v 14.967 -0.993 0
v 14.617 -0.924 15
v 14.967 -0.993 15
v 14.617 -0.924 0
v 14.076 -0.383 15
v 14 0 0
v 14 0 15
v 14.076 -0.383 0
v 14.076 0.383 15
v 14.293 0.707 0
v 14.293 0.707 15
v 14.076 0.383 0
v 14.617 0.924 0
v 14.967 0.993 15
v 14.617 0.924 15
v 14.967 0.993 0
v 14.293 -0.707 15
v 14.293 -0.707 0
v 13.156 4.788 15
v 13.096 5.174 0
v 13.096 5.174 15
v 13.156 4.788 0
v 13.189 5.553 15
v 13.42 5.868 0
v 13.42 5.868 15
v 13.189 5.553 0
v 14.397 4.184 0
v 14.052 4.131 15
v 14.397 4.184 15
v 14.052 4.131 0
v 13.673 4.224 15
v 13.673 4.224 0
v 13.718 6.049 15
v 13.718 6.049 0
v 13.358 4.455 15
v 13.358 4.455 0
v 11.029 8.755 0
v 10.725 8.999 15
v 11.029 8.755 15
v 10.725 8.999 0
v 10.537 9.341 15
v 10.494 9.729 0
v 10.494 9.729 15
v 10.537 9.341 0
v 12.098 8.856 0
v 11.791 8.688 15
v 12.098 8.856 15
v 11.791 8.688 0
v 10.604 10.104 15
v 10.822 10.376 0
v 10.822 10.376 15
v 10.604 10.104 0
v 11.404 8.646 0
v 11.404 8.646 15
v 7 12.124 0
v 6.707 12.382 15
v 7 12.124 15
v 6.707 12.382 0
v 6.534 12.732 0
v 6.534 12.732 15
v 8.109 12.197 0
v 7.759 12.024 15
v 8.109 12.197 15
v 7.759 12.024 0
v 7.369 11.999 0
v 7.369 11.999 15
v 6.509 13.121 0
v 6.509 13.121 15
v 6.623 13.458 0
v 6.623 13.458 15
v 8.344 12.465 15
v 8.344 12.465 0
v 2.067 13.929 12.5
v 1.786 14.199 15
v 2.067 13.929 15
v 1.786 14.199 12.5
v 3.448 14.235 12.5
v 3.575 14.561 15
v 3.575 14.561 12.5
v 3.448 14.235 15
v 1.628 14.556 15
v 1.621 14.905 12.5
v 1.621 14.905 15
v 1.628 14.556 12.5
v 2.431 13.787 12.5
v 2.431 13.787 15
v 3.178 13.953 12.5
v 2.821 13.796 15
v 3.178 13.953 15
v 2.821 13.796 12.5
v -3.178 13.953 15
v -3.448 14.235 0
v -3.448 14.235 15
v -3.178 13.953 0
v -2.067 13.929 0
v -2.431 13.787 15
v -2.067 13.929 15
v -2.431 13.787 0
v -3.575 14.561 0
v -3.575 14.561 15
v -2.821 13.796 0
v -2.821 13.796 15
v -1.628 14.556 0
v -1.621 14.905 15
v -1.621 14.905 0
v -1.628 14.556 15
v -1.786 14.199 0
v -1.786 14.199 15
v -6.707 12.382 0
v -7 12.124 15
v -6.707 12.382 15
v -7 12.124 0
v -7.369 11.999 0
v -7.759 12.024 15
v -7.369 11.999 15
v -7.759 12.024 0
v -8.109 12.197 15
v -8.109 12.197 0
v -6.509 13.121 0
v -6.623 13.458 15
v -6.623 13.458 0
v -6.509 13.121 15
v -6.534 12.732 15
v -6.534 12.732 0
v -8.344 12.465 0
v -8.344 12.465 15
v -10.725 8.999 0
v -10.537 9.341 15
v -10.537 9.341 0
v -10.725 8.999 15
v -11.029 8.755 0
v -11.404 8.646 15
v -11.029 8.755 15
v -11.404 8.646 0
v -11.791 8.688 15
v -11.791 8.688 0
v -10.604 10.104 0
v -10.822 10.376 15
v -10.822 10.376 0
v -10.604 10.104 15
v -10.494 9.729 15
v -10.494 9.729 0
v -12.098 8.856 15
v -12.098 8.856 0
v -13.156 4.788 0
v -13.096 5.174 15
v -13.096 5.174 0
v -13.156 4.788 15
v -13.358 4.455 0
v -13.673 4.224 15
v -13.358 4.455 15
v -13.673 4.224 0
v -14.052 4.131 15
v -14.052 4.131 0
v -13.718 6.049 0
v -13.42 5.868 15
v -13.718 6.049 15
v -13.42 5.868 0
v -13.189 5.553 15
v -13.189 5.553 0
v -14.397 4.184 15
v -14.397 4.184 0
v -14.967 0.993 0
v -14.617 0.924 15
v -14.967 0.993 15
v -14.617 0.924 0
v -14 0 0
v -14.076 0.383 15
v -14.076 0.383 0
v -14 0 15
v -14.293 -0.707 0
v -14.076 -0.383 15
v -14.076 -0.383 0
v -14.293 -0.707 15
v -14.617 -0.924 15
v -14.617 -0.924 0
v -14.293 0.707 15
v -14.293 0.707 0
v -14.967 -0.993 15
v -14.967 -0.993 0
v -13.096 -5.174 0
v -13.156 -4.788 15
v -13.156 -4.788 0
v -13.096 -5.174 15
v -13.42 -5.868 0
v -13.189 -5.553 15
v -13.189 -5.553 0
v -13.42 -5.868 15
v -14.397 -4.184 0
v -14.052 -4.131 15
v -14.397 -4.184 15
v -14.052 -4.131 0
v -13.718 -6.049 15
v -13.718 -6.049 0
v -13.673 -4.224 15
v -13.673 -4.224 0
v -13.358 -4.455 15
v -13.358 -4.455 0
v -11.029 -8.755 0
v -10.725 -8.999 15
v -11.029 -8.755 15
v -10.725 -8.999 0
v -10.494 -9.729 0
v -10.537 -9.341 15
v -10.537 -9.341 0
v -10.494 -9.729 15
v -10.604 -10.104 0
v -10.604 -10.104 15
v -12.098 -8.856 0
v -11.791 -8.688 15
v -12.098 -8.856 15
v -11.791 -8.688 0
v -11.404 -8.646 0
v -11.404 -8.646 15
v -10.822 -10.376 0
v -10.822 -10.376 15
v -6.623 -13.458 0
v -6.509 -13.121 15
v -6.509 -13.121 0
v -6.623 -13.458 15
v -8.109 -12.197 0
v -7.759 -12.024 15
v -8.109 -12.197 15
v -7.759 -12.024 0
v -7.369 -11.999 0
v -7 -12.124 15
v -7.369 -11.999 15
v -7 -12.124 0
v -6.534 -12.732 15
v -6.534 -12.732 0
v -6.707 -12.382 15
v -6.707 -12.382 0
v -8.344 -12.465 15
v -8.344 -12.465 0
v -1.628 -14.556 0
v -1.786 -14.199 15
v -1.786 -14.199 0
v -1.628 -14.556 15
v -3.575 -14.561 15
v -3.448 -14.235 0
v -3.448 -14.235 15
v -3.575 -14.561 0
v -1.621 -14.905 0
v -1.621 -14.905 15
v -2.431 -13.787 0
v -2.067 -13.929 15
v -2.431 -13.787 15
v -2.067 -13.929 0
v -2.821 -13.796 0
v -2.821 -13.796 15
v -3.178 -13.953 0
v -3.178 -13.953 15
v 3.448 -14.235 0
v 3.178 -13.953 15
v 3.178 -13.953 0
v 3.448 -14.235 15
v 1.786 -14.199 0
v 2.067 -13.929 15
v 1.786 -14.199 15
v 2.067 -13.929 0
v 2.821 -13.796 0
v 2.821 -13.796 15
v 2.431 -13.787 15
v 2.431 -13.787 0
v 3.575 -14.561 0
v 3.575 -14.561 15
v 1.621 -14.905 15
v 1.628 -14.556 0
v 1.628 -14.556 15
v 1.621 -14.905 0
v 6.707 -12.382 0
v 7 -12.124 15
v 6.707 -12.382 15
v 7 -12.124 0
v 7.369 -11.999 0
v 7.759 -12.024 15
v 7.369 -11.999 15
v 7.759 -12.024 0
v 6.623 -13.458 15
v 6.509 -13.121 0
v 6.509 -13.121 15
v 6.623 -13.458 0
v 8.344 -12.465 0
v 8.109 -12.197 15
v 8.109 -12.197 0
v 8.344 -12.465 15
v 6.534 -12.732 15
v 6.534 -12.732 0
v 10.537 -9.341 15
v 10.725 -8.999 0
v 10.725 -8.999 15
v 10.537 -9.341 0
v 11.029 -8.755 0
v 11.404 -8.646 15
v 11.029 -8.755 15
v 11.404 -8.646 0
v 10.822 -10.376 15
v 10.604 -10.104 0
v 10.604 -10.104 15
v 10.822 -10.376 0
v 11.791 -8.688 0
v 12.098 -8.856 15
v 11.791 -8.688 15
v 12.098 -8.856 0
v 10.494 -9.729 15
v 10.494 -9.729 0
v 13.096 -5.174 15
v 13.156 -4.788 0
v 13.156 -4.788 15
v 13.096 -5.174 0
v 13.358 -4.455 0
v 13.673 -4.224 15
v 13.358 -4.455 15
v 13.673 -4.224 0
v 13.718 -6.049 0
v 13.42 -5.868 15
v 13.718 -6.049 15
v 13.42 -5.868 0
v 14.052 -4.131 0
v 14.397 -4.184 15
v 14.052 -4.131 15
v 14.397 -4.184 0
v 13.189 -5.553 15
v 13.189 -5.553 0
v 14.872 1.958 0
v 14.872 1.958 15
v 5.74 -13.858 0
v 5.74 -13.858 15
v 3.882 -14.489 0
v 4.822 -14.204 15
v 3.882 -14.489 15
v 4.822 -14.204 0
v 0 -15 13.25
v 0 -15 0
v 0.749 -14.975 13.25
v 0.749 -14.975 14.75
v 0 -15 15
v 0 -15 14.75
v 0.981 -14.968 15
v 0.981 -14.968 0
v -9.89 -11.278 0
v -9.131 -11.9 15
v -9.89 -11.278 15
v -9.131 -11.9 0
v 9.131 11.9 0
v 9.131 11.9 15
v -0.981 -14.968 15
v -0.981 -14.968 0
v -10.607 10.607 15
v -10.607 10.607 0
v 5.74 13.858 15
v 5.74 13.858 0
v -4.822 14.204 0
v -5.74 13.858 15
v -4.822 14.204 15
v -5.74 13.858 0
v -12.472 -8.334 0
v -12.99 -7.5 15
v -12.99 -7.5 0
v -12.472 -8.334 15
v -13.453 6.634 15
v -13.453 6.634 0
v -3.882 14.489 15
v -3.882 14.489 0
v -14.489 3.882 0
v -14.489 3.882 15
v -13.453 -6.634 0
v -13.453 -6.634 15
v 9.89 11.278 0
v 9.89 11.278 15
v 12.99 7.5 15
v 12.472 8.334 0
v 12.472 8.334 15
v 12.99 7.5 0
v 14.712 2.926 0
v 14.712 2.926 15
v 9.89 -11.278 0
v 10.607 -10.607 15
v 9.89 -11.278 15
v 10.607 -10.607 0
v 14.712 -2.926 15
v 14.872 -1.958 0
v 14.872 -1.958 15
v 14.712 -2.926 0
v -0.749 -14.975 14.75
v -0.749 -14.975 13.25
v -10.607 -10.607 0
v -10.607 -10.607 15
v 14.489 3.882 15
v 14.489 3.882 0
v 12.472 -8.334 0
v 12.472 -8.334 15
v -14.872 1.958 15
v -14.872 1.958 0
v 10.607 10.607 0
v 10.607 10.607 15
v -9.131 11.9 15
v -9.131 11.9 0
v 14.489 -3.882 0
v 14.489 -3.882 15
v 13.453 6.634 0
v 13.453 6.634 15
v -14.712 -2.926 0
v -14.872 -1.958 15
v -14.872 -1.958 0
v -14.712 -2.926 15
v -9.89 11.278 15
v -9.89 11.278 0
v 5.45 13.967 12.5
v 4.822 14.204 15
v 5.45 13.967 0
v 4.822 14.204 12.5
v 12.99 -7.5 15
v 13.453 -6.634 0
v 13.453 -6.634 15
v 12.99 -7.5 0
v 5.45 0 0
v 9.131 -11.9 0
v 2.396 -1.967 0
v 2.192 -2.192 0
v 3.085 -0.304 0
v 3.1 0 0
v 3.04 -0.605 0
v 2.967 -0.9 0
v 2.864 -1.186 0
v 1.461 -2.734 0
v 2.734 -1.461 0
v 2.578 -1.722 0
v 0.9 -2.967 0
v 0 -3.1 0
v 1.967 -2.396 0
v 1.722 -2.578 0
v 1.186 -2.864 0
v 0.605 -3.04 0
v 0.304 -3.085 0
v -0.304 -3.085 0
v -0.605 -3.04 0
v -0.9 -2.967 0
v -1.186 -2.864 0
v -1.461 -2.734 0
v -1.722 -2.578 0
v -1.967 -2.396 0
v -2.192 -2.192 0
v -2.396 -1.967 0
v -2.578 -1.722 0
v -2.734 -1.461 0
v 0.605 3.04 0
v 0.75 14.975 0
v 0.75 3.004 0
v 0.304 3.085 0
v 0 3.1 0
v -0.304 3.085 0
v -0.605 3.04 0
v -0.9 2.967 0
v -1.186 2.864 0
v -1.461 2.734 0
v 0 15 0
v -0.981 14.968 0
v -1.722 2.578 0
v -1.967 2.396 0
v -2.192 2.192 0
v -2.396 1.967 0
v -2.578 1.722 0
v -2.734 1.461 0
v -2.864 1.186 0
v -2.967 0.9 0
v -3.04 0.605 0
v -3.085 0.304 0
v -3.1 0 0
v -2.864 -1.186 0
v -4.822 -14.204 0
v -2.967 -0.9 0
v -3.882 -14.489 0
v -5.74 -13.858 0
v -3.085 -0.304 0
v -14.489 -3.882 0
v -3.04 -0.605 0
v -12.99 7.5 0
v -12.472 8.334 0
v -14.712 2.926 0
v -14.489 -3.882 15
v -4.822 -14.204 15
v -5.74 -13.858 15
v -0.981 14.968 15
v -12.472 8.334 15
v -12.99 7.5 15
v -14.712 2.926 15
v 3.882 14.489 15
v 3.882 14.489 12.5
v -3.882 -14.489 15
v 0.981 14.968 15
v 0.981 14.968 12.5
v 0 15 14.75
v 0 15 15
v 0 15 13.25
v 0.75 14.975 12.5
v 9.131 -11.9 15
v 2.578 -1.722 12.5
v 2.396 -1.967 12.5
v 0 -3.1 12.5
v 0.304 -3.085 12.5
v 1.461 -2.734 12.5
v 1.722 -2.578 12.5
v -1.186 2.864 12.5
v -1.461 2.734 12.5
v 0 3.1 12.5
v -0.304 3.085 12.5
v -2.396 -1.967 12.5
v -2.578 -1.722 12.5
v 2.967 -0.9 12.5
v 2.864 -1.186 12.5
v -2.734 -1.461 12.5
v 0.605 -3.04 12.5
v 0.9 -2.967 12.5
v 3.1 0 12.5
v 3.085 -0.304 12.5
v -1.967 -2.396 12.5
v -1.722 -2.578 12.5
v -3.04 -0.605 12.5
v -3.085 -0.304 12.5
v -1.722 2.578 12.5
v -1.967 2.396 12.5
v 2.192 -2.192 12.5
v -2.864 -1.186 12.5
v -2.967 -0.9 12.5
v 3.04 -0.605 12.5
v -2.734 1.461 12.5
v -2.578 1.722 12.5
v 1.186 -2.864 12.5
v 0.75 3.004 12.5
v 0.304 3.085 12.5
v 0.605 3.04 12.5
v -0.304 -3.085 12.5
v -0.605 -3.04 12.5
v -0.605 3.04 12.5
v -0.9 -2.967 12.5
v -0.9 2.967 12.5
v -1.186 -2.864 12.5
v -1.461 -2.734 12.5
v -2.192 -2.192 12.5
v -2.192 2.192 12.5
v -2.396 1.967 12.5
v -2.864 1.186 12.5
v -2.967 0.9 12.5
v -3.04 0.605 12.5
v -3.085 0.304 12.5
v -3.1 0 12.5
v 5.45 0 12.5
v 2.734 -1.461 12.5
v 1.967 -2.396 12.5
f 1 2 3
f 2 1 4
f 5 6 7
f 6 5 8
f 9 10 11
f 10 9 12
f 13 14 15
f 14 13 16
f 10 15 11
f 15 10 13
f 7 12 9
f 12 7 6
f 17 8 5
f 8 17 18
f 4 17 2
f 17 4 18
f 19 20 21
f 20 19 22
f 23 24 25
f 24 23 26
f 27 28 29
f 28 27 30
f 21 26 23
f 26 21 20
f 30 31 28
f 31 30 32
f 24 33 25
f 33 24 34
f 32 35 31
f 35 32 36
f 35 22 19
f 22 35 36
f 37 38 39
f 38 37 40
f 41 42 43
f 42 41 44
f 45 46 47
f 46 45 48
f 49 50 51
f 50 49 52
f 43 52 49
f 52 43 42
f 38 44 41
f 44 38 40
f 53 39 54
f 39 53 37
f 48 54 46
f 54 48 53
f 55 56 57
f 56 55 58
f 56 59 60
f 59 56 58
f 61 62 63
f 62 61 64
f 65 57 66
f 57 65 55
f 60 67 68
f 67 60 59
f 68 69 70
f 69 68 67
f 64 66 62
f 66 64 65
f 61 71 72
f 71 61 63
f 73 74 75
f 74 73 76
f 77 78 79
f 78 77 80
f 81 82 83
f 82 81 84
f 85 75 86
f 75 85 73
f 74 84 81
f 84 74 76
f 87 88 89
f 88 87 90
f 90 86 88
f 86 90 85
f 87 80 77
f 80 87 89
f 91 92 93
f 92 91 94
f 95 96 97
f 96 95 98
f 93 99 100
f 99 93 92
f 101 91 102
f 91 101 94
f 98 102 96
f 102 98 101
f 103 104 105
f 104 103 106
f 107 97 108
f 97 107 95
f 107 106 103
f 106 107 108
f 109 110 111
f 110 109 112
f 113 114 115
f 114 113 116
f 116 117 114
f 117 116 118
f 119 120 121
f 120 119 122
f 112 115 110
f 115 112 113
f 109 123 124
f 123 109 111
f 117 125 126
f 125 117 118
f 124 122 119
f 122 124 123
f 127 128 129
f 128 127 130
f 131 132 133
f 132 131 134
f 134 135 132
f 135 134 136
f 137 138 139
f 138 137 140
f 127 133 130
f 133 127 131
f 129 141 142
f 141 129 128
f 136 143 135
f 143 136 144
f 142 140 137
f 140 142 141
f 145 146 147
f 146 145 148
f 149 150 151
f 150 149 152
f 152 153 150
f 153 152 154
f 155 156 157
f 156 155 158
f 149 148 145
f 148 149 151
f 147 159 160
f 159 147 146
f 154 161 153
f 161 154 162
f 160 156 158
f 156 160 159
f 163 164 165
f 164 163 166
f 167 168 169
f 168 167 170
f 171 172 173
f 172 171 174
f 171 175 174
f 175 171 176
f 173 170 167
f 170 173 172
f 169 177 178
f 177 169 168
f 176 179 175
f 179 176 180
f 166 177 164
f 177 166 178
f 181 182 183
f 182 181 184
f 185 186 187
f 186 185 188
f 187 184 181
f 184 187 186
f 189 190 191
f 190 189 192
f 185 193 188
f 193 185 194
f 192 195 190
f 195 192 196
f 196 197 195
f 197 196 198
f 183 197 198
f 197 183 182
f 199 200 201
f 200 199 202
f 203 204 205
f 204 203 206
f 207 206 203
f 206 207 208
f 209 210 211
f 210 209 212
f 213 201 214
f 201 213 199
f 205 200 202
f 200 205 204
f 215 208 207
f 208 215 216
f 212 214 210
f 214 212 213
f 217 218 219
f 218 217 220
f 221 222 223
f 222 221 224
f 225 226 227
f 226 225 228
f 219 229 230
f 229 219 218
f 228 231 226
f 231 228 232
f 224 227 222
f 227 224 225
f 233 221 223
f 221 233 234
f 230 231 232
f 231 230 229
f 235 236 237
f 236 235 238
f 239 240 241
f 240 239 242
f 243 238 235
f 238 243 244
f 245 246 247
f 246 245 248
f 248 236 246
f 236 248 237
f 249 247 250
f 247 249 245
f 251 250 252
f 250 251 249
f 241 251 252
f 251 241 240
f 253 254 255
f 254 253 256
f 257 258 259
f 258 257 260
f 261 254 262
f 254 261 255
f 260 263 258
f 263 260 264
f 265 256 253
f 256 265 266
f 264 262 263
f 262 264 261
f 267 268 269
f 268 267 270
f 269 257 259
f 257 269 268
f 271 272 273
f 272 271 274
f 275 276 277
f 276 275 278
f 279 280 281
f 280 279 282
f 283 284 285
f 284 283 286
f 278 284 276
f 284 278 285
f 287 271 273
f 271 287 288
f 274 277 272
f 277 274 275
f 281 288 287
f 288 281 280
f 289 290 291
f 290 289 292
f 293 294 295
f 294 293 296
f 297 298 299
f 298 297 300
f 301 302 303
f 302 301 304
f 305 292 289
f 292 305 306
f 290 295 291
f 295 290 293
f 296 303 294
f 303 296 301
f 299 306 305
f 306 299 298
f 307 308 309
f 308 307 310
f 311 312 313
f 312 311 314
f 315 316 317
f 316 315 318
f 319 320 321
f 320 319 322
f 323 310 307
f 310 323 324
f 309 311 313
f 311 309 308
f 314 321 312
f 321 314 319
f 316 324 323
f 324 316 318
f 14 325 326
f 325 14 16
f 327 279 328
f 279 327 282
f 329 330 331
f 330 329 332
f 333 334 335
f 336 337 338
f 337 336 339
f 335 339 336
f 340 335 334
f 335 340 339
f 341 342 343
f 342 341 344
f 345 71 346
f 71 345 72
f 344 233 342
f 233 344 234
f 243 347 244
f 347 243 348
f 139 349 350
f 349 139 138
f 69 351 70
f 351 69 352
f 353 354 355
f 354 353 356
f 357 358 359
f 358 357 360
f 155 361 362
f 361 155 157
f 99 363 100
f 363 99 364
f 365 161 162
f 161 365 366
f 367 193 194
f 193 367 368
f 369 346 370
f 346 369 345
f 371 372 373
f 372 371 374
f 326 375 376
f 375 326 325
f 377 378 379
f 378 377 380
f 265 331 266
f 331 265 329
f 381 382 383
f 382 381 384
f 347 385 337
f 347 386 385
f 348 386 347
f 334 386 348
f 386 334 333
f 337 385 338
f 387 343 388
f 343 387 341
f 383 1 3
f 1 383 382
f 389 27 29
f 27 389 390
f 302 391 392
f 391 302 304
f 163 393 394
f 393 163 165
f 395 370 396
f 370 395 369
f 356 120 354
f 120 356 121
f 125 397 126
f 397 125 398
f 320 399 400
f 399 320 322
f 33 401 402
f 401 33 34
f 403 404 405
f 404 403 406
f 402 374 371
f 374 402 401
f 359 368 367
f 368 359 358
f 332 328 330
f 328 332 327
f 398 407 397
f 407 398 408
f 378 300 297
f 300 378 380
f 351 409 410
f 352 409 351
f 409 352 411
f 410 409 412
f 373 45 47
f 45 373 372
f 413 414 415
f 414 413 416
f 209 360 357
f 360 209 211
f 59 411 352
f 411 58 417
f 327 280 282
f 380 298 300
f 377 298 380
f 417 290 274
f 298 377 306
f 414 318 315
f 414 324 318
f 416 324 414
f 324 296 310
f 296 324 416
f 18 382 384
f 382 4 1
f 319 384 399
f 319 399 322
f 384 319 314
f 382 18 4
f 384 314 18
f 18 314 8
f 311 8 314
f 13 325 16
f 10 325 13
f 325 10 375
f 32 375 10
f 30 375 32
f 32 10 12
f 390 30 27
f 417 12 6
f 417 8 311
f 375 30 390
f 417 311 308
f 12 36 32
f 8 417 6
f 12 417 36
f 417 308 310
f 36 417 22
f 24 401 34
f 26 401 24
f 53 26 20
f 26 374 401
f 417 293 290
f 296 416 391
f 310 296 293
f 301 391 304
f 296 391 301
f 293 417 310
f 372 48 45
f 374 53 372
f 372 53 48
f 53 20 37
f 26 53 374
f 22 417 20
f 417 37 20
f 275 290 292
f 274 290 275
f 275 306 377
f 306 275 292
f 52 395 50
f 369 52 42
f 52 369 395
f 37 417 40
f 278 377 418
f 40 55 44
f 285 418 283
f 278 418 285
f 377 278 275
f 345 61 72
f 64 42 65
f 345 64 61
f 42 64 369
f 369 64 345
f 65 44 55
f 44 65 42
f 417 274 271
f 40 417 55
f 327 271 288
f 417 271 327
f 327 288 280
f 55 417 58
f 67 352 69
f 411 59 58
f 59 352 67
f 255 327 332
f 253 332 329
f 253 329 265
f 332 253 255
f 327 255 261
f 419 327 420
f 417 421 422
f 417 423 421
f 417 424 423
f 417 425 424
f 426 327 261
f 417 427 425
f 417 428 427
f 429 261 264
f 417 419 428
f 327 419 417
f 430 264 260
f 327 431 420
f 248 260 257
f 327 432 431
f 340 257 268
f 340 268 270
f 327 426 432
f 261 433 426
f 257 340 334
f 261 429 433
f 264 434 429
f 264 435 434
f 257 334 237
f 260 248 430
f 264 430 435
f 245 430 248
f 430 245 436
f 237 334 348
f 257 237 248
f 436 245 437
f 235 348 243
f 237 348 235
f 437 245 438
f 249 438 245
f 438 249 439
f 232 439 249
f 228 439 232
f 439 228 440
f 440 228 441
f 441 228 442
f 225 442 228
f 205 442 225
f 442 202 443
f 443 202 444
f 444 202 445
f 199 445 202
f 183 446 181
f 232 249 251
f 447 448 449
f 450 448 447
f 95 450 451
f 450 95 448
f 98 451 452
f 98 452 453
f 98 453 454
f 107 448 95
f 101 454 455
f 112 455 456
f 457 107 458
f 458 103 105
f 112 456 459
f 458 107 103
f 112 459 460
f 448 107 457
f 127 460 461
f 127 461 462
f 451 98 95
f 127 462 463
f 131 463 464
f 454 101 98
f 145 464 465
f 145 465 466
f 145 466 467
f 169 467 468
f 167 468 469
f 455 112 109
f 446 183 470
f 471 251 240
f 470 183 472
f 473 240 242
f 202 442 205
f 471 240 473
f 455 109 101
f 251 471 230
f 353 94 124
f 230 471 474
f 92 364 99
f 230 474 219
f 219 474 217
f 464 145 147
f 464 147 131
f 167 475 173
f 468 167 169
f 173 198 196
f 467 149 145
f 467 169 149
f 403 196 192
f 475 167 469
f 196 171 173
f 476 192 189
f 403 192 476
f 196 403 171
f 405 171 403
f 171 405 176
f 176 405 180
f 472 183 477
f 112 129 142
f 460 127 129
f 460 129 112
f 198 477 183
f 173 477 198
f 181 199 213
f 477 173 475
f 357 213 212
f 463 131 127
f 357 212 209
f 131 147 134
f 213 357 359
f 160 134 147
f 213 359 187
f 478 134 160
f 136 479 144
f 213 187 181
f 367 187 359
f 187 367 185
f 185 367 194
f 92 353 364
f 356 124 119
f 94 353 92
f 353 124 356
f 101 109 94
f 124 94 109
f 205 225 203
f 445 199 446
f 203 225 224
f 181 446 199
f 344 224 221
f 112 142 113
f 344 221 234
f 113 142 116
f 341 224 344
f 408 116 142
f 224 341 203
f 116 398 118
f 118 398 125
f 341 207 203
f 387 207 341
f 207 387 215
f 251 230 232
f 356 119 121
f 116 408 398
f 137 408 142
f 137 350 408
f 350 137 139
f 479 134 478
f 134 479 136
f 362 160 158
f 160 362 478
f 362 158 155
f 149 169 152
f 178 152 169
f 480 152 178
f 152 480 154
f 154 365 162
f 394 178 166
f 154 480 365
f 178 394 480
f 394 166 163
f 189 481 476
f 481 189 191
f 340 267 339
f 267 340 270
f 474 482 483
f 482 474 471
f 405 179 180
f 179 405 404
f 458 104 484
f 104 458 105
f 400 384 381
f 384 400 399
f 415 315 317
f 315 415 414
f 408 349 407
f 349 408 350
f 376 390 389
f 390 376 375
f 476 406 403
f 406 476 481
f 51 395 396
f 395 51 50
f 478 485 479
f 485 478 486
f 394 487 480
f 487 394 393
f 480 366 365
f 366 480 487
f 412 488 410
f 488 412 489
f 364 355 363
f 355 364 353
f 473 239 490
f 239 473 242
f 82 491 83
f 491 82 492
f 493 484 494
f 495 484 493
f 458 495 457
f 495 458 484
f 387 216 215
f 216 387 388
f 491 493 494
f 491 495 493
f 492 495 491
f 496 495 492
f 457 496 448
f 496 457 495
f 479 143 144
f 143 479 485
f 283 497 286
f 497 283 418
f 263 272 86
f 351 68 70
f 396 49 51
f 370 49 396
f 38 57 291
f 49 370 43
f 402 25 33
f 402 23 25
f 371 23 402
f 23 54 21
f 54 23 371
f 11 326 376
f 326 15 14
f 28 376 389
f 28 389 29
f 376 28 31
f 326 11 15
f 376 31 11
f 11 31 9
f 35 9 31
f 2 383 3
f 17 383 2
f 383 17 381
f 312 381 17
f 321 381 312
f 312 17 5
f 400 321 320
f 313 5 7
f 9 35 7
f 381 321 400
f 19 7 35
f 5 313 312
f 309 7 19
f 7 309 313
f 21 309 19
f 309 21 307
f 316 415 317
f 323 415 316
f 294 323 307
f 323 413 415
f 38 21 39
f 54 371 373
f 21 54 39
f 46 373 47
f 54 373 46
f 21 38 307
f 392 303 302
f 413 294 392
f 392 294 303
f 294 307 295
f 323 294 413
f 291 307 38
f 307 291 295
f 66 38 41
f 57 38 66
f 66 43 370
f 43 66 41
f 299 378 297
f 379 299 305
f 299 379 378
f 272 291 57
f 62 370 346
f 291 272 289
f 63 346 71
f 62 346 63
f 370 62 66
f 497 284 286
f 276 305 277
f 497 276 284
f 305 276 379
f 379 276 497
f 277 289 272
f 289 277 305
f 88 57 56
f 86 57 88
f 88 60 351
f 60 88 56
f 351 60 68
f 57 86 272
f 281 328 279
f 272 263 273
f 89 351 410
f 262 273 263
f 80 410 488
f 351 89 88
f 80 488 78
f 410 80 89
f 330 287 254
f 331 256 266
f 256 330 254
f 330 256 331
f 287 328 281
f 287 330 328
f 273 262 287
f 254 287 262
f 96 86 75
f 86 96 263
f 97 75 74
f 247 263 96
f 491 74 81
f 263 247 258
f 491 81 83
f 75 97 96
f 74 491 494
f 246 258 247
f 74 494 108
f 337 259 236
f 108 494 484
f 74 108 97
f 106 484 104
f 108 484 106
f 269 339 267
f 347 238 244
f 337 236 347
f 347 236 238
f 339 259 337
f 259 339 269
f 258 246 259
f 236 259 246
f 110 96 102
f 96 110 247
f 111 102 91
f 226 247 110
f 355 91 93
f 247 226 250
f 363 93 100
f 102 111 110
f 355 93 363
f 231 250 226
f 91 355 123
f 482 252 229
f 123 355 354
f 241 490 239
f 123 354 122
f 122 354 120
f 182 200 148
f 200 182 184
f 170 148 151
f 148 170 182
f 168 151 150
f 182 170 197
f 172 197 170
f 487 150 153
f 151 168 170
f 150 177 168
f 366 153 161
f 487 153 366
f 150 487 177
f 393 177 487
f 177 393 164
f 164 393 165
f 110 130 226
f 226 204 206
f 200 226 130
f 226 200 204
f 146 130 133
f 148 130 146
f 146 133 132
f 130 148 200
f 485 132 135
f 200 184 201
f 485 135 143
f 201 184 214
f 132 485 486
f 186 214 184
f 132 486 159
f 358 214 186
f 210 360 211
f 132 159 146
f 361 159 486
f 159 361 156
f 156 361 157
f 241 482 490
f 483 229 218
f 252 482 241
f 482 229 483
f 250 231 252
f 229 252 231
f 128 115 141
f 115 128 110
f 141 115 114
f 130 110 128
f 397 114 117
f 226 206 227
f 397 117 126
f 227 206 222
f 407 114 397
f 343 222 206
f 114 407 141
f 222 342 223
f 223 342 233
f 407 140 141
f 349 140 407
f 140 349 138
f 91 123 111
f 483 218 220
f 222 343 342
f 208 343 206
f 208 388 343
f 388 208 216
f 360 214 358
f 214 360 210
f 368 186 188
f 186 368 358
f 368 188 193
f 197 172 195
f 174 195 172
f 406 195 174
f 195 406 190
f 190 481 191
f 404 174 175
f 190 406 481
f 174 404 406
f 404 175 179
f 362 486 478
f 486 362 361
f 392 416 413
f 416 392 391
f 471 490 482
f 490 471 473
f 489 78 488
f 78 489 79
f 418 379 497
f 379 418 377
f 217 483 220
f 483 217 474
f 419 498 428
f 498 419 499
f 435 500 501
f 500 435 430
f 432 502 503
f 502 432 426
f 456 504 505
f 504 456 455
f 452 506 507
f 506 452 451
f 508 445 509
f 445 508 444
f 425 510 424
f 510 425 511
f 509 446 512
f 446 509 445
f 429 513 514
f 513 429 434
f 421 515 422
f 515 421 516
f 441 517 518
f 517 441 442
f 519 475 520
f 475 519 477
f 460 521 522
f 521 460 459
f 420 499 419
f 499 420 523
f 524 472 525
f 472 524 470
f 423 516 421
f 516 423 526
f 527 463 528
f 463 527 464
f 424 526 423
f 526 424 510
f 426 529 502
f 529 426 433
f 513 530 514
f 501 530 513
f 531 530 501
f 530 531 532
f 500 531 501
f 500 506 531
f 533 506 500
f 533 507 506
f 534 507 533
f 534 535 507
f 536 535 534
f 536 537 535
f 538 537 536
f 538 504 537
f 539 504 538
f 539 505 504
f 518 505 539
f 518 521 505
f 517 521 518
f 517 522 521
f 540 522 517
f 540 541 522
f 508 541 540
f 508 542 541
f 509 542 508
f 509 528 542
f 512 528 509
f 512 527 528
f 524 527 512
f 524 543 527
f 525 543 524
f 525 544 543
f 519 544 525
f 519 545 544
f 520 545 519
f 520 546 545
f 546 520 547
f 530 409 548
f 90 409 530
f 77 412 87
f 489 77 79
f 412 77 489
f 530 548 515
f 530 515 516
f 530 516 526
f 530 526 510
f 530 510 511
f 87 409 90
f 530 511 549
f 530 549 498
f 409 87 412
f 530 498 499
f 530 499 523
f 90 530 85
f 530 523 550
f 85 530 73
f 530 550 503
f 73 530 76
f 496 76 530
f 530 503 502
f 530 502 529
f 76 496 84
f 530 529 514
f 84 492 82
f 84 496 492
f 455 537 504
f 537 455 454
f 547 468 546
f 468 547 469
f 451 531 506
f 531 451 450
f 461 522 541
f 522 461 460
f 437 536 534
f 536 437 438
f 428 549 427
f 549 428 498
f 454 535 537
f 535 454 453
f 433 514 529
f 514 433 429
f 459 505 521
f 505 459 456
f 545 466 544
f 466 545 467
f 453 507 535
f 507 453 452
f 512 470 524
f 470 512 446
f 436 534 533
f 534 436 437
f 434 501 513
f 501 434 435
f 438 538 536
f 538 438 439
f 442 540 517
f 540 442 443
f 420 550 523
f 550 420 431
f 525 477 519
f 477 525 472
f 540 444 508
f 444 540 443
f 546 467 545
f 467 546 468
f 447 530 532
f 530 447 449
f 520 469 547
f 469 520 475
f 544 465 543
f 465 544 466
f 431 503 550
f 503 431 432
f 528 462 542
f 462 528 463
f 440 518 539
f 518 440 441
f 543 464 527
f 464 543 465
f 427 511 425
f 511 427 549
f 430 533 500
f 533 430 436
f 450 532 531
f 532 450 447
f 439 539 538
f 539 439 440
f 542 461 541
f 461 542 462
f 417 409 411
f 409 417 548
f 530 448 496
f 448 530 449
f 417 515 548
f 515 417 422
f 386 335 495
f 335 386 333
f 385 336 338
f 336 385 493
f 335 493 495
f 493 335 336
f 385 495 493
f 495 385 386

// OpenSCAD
// Replacement knob for a hotplate stirrer with a D-shaft
// Print orientation: bottom face (with D-bore) on the bed at z = 0

// ---------------- Parameters ----------------
knob_d        = 30;    // knob outer diameter
knob_h        = 15;    // knob height
shaft_d       = 6.2;   // D-shaft diameter (bore diameter)
bore_depth    = 12;    // blind bore depth from bottom face
bore_flat     = 4.7;   // distance from D-bore flat to opposite side of circle
groove_count  = 18;    // number of vertical grip grooves
groove_d      = 2;     // grip groove diameter (half-cylinder)
pointer_w     = 1.5;   // pointer groove width
pointer_d     = 1;     // pointer groove depth
eps           = 0.5;   // overcut so cutting faces are not coplanar

$fn = 96;

// ---------------- Model ----------------
difference() {
    // Main body, centred on origin in XY, sitting on z = 0
    cylinder(d = knob_d, h = knob_h);

    // D-shaped blind bore from bottom face
    translate([0, 0, -eps])
        cylinder(d = shaft_d, h = bore_depth + 2 * eps, $fn = 64);
    // cut the flat side of the D, leaving the specified distance to the arc
    translate([-(bore_flat - shaft_d) / 2, 0, -eps])
        cube([bore_flat, knob_d + 2 * eps, bore_depth + 2 * eps]);

    // Vertical grip grooves around the full height
    for (i = [0 : groove_count - 1])
        rotate([0, 0, i * 360 / groove_count])
            translate([knob_d / 2, 0, -eps])
                cylinder(d = groove_d, h = knob_h + 2 * eps, $fn = 16);

    // Pointer groove on top face, from centre to outer edge
    translate([0, 0, knob_h - pointer_d])
        linear_extrude(height = pointer_w, center = true)
            polygon([[-pointer_w / 2, -knob_d / 2],
                     [ pointer_w / 2, -knob_d / 2],
                     [0, knob_d / 2]]);
}
